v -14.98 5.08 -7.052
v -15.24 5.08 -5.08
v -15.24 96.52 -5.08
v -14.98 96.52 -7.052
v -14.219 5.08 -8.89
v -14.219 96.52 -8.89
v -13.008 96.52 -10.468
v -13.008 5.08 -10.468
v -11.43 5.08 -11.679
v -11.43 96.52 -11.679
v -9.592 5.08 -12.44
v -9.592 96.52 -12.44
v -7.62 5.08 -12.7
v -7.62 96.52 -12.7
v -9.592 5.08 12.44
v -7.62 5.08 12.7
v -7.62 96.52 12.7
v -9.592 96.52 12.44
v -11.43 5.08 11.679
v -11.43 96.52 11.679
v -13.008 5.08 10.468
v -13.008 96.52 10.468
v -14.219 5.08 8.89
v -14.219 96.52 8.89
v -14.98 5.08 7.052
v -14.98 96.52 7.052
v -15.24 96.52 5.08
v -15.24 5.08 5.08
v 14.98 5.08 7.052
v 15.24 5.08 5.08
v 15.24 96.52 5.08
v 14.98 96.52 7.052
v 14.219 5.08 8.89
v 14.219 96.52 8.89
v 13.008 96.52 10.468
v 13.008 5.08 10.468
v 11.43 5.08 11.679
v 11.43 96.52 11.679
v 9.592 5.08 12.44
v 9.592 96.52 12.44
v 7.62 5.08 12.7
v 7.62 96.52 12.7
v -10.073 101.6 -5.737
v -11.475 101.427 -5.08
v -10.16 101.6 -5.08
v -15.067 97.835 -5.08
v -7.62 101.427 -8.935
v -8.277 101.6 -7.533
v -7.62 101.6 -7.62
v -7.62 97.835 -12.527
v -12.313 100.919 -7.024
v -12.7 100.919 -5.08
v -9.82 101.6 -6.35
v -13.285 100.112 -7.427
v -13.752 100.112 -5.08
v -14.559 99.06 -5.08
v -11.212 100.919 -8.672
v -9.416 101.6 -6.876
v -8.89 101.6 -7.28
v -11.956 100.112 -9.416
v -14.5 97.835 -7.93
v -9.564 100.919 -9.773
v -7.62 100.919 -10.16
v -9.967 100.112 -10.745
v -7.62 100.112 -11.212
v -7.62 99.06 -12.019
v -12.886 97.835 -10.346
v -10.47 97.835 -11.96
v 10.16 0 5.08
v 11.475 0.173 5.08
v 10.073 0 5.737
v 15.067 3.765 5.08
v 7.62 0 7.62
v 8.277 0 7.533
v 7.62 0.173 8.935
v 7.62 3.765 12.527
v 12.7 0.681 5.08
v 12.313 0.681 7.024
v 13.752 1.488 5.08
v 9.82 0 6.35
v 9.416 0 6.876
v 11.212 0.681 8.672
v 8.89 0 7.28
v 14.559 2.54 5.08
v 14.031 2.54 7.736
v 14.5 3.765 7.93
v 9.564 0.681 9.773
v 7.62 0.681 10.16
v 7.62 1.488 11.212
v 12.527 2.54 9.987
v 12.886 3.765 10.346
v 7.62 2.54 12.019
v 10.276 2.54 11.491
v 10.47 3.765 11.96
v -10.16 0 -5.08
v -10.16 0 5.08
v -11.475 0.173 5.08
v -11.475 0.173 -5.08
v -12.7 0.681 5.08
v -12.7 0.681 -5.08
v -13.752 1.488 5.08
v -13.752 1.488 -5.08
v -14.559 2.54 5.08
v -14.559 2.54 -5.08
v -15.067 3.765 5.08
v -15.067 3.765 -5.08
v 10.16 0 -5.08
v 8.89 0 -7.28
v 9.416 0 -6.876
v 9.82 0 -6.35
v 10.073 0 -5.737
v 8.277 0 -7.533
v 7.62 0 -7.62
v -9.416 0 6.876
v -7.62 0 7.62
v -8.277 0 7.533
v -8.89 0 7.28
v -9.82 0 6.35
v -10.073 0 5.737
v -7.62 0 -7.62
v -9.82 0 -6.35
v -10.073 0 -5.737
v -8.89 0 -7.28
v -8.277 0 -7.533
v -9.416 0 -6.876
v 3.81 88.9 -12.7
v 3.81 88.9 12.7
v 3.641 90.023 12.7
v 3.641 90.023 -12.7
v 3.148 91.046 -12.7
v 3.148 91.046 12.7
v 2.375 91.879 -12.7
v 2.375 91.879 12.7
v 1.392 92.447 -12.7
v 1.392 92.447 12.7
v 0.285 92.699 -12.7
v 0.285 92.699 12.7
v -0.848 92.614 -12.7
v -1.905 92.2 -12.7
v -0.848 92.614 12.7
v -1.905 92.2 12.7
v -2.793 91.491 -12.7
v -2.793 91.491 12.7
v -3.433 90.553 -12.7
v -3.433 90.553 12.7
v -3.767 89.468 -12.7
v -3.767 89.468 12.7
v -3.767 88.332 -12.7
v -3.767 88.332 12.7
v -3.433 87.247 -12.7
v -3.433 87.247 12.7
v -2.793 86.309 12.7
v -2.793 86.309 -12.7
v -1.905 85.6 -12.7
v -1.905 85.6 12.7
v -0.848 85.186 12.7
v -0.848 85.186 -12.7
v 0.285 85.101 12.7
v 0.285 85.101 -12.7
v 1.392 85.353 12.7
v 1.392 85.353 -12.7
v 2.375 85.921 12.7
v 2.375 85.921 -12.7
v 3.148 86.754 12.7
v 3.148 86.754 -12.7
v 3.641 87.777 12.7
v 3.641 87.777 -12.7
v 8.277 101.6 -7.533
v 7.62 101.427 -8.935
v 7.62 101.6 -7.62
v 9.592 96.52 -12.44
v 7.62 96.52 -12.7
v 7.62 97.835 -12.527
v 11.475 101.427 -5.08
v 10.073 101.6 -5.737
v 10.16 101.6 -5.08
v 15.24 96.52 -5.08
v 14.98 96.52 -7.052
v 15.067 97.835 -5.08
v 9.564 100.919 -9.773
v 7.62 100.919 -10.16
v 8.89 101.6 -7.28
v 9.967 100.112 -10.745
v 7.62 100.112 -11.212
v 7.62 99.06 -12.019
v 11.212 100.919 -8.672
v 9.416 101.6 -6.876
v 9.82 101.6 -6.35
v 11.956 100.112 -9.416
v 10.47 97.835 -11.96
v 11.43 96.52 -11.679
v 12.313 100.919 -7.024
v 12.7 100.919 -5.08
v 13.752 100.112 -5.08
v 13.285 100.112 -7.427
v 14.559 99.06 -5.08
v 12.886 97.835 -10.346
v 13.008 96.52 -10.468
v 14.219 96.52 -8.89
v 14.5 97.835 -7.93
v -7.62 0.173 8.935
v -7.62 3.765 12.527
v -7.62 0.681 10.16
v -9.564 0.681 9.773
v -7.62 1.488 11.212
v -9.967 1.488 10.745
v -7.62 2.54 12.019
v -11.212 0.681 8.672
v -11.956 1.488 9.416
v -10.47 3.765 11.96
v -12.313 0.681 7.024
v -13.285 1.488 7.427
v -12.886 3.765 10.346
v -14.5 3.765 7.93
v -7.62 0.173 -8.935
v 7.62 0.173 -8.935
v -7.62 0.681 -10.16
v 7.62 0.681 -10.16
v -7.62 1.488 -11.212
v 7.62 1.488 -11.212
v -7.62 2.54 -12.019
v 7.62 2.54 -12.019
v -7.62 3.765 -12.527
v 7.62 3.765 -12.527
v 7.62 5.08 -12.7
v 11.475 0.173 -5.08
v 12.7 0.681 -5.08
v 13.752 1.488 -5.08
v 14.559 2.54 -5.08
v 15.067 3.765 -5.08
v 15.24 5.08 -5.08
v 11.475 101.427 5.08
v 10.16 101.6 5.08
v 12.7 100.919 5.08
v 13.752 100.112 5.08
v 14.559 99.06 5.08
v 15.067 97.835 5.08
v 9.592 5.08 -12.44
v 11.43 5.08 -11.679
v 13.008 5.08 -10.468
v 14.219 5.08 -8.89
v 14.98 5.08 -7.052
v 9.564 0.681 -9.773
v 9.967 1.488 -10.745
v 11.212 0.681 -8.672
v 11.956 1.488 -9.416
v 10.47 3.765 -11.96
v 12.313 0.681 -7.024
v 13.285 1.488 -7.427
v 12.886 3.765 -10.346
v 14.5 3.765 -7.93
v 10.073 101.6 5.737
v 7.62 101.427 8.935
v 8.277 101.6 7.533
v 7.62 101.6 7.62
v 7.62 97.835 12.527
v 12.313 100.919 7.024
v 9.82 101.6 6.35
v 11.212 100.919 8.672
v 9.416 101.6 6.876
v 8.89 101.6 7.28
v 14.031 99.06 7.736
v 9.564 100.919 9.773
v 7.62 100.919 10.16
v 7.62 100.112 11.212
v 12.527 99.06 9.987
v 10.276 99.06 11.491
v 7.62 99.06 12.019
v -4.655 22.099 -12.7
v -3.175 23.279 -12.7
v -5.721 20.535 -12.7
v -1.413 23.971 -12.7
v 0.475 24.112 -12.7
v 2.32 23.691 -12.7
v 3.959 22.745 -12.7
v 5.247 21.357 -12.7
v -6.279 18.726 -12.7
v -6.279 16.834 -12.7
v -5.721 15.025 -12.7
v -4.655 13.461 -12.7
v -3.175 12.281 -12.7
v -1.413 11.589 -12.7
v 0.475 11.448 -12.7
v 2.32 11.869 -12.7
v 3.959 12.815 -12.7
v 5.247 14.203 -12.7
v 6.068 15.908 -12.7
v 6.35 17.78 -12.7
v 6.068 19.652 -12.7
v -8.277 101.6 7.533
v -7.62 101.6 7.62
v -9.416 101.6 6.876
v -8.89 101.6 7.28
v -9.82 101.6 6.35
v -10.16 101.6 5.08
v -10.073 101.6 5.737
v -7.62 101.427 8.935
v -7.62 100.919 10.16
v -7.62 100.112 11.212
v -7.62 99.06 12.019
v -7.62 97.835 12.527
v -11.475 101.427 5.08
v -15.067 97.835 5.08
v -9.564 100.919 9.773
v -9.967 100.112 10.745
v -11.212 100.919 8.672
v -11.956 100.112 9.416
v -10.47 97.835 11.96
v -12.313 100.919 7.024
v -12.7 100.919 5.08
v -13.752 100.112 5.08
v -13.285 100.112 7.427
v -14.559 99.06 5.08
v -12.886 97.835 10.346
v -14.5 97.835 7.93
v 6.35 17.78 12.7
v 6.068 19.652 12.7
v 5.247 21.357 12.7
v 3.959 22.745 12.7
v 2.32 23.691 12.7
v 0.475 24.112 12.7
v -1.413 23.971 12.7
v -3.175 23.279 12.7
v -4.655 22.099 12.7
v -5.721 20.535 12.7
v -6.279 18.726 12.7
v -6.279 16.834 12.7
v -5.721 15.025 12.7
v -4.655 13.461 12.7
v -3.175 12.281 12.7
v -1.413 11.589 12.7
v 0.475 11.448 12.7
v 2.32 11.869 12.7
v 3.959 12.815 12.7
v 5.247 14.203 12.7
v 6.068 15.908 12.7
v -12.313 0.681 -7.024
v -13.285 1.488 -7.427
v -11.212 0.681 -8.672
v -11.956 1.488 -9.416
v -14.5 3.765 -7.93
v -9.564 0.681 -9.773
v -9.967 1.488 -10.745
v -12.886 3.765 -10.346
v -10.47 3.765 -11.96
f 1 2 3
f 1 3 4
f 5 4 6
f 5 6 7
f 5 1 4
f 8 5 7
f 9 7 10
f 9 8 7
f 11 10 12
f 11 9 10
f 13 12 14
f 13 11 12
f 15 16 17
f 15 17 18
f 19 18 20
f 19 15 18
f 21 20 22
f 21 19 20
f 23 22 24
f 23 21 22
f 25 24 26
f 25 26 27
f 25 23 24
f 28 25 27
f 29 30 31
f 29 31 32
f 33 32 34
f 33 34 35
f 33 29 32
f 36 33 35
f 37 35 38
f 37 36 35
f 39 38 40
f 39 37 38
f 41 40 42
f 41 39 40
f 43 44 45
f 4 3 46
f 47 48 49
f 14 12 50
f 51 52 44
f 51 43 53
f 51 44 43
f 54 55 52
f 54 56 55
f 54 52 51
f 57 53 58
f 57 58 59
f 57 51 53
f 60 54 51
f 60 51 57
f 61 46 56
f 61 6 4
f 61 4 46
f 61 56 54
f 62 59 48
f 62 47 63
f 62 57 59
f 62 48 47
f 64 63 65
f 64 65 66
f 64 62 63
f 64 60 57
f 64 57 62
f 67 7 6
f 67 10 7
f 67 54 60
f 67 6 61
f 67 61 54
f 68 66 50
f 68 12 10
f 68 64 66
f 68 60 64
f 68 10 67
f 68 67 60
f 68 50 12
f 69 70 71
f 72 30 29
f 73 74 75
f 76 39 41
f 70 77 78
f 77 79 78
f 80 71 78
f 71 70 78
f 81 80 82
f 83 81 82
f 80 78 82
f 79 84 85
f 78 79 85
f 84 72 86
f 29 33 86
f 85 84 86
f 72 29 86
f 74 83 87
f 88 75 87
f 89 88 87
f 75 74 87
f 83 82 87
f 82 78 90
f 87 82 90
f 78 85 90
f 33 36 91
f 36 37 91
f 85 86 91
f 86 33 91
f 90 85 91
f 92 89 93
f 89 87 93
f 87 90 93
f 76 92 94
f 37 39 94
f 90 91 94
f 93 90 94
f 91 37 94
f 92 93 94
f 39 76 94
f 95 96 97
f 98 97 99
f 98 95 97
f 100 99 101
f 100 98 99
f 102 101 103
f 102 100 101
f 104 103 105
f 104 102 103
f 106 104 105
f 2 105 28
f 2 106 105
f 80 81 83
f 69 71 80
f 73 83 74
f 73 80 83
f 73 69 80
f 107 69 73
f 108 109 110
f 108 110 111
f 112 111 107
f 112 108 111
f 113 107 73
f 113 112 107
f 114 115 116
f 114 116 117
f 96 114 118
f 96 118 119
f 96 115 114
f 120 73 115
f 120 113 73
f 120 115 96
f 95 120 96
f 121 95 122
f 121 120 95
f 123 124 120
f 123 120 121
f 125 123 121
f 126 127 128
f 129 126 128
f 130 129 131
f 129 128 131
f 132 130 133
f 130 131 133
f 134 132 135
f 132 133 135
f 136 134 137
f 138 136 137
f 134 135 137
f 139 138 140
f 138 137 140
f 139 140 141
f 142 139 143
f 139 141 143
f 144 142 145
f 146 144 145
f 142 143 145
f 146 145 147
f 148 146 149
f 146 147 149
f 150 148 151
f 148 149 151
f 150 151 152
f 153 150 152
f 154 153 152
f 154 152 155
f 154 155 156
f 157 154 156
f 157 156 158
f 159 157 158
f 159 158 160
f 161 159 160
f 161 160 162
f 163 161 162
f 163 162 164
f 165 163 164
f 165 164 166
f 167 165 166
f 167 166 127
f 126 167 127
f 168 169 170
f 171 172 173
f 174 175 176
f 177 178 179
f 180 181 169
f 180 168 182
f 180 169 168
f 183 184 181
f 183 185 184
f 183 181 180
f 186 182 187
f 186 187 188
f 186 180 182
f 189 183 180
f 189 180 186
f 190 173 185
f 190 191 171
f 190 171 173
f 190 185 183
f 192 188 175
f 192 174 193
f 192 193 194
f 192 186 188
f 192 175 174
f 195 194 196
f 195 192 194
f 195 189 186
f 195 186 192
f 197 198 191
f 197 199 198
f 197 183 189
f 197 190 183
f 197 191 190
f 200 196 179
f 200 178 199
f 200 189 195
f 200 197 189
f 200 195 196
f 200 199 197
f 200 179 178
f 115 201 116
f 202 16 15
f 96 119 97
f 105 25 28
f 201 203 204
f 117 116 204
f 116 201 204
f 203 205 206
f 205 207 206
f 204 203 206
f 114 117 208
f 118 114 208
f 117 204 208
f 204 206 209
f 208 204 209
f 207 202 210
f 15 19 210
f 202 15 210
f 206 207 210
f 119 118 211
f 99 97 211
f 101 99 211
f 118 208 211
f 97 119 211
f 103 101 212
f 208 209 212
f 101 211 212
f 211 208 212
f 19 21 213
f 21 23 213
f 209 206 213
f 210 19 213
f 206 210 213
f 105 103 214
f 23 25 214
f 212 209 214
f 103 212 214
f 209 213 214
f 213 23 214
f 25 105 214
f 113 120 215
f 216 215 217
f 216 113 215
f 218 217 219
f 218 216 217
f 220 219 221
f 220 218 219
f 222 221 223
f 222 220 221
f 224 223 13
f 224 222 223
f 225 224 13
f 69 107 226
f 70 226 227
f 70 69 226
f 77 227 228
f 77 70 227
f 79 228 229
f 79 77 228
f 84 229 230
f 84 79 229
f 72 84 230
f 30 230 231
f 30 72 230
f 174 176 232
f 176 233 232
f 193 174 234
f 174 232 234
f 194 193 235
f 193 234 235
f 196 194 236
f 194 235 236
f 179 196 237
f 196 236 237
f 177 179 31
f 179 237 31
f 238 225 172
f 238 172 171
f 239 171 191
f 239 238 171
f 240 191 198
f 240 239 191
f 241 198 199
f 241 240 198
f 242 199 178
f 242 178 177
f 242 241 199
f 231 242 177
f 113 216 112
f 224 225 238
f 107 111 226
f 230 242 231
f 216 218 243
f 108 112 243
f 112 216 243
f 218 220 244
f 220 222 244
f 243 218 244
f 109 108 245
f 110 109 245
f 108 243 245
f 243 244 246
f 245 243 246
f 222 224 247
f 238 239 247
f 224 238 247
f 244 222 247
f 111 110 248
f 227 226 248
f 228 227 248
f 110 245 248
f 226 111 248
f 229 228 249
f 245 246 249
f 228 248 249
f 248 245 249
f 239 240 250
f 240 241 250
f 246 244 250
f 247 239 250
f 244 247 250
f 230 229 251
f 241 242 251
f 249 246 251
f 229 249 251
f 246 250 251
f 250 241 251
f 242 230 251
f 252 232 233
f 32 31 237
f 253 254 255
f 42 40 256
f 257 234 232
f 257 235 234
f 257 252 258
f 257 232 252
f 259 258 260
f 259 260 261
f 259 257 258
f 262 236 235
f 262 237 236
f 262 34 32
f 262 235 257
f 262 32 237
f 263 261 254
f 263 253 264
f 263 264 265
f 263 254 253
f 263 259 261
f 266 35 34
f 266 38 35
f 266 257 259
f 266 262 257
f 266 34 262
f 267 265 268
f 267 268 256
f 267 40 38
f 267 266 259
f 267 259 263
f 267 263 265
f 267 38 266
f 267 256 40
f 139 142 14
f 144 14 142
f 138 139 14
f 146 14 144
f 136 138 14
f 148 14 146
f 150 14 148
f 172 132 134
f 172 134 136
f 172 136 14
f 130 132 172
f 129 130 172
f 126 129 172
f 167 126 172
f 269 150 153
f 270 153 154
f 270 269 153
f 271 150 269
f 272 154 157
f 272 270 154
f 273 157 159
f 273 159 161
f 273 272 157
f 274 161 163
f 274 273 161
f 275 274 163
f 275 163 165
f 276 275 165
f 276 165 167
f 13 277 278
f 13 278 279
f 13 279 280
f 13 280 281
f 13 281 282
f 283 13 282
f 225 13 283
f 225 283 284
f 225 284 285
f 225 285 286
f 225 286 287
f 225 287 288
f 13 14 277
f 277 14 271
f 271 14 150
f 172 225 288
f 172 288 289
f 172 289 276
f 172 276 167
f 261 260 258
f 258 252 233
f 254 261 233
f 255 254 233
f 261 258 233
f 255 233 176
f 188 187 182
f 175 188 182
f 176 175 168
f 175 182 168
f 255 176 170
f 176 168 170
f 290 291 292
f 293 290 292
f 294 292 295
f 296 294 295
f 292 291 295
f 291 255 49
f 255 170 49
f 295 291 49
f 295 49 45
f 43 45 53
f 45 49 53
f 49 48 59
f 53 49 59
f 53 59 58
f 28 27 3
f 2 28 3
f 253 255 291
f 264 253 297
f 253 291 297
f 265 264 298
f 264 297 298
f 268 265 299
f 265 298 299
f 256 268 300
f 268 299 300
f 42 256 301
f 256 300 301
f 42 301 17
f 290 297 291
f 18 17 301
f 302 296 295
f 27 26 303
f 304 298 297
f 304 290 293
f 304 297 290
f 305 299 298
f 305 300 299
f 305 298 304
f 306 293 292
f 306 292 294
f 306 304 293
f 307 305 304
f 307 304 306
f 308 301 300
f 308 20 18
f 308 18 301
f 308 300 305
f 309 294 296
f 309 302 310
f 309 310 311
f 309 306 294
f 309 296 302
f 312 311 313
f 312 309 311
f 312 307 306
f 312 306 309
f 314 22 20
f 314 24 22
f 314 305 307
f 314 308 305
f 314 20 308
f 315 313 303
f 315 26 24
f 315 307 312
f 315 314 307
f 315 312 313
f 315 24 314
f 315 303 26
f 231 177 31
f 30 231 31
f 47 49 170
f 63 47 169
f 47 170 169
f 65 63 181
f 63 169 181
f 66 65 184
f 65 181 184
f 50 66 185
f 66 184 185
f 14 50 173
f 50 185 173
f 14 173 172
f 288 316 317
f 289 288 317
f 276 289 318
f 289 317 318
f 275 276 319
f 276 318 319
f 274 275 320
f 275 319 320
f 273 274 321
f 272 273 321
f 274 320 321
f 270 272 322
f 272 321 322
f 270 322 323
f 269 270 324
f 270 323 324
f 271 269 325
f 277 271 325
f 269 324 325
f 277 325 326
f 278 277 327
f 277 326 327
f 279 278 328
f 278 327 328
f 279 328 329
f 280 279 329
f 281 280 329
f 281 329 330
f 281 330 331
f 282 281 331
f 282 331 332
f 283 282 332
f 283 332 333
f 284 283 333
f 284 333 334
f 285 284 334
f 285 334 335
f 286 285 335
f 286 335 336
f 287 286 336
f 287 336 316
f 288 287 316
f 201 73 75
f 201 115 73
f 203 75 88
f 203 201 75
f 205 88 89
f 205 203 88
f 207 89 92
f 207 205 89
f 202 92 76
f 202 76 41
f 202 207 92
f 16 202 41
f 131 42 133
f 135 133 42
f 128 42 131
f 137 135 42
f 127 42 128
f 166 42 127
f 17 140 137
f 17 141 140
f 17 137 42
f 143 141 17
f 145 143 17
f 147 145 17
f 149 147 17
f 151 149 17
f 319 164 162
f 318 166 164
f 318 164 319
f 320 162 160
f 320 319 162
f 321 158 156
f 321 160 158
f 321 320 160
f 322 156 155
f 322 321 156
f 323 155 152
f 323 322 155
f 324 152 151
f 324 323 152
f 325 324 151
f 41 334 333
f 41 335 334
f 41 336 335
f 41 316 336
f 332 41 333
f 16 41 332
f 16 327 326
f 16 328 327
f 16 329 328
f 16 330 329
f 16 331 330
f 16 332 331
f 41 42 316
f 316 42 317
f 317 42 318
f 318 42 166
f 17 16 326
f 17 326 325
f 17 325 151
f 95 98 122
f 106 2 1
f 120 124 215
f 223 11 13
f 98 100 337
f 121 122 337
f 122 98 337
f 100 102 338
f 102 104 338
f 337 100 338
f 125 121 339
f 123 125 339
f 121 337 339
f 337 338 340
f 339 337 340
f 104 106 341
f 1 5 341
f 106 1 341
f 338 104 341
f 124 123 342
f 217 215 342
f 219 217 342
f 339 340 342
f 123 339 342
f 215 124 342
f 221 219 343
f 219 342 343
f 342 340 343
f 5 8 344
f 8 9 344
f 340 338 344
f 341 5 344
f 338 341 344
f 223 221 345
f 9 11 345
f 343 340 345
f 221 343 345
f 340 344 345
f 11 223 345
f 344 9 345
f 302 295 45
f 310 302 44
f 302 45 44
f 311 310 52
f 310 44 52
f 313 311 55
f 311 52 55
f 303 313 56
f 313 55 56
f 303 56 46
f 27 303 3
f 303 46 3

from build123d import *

# Parameters (mm, degrees)
BOSS_EXTRUDE1_DEPTH = 101.6
SKETCH2_R           = 6.35
CUT_EXTRUDE1_DEPTH  = 106.829946612
SKETCH3_R           = 3.81
CUT_EXTRUDE2_DEPTH  = 106.829946612
FILLET1_R           = 5.08
FILLET2_R           = 5.08


with BuildPart() as part:
    # Sketch1 → Boss-Extrude1 (new body)
    with BuildSketch(Plane(origin=(0, 0, 0), x_dir=(1, 0, 0), z_dir=(0, 1, 0))):
        with BuildLine():
            Line((-7.62, 12.7), (7.62, 12.7))
            ThreePointArc((7.62, 12.7), (13.008153673, 10.468153673), (15.24, 5.08))
            Line((15.24, 5.08), (15.24, -5.08))
            ThreePointArc((15.24, -5.08), (13.008153673, -10.468153673), (7.62, -12.7))
            Line((7.62, -12.7), (-7.62, -12.7))
            ThreePointArc((-7.62, -12.7), (-13.008153673, -10.468153673), (-15.24, -5.08))
            Line((-15.24, -5.08), (-15.24, 5.08))
            ThreePointArc((-15.24, 5.08), (-13.008153673, 10.468153673), (-7.62, 12.7))
        make_face()
    extrude(amount=BOSS_EXTRUDE1_DEPTH)

    # Sketch2 → Cut-Extrude1 (cut, through all)
    with BuildSketch(Plane.XY.offset(12.7)):
        with Locations((0, 17.78)):
            Circle(SKETCH2_R)
    extrude(amount=-CUT_EXTRUDE1_DEPTH, mode=Mode.SUBTRACT)

    # Sketch3 → Cut-Extrude2 (cut, through all)
    with BuildSketch(Plane.XY.offset(12.7)):
        with Locations((0, 88.9)):
            Circle(SKETCH3_R)
    extrude(amount=-CUT_EXTRUDE2_DEPTH, mode=Mode.SUBTRACT)

    # Fillet1
    fillet1_edges = [part.edges().sort_by_distance(p)[0] for p in [
        (0, 0, 12.7),
        (-13.008153673, 0, 10.468153673),
        (-15.24, 0, 0),
        (-13.008153673, 0, -10.468153673),
        (0, 0, -12.7),
        (13.008153673, 0, -10.468153673),
        (15.24, 0, 0),
        (13.008153673, 0, 10.468153673),
    ]]
    fillet(fillet1_edges, radius=FILLET1_R)

    # Fillet2
    fillet2_edges = [part.edges().sort_by_distance(p)[0] for p in [
        (13.008153673, 101.6, 10.468153673),
        (15.24, 101.6, 0),
        (13.008153673, 101.6, -10.468153673),
        (0, 101.6, -12.7),
        (-13.008153673, 101.6, -10.468153673),
        (-15.24, 101.6, 0),
        (-13.008153673, 101.6, 10.468153673),
        (0, 101.6, 12.7),
    ]]
    fillet(fillet2_edges, radius=FILLET2_R)


solid = part.part
